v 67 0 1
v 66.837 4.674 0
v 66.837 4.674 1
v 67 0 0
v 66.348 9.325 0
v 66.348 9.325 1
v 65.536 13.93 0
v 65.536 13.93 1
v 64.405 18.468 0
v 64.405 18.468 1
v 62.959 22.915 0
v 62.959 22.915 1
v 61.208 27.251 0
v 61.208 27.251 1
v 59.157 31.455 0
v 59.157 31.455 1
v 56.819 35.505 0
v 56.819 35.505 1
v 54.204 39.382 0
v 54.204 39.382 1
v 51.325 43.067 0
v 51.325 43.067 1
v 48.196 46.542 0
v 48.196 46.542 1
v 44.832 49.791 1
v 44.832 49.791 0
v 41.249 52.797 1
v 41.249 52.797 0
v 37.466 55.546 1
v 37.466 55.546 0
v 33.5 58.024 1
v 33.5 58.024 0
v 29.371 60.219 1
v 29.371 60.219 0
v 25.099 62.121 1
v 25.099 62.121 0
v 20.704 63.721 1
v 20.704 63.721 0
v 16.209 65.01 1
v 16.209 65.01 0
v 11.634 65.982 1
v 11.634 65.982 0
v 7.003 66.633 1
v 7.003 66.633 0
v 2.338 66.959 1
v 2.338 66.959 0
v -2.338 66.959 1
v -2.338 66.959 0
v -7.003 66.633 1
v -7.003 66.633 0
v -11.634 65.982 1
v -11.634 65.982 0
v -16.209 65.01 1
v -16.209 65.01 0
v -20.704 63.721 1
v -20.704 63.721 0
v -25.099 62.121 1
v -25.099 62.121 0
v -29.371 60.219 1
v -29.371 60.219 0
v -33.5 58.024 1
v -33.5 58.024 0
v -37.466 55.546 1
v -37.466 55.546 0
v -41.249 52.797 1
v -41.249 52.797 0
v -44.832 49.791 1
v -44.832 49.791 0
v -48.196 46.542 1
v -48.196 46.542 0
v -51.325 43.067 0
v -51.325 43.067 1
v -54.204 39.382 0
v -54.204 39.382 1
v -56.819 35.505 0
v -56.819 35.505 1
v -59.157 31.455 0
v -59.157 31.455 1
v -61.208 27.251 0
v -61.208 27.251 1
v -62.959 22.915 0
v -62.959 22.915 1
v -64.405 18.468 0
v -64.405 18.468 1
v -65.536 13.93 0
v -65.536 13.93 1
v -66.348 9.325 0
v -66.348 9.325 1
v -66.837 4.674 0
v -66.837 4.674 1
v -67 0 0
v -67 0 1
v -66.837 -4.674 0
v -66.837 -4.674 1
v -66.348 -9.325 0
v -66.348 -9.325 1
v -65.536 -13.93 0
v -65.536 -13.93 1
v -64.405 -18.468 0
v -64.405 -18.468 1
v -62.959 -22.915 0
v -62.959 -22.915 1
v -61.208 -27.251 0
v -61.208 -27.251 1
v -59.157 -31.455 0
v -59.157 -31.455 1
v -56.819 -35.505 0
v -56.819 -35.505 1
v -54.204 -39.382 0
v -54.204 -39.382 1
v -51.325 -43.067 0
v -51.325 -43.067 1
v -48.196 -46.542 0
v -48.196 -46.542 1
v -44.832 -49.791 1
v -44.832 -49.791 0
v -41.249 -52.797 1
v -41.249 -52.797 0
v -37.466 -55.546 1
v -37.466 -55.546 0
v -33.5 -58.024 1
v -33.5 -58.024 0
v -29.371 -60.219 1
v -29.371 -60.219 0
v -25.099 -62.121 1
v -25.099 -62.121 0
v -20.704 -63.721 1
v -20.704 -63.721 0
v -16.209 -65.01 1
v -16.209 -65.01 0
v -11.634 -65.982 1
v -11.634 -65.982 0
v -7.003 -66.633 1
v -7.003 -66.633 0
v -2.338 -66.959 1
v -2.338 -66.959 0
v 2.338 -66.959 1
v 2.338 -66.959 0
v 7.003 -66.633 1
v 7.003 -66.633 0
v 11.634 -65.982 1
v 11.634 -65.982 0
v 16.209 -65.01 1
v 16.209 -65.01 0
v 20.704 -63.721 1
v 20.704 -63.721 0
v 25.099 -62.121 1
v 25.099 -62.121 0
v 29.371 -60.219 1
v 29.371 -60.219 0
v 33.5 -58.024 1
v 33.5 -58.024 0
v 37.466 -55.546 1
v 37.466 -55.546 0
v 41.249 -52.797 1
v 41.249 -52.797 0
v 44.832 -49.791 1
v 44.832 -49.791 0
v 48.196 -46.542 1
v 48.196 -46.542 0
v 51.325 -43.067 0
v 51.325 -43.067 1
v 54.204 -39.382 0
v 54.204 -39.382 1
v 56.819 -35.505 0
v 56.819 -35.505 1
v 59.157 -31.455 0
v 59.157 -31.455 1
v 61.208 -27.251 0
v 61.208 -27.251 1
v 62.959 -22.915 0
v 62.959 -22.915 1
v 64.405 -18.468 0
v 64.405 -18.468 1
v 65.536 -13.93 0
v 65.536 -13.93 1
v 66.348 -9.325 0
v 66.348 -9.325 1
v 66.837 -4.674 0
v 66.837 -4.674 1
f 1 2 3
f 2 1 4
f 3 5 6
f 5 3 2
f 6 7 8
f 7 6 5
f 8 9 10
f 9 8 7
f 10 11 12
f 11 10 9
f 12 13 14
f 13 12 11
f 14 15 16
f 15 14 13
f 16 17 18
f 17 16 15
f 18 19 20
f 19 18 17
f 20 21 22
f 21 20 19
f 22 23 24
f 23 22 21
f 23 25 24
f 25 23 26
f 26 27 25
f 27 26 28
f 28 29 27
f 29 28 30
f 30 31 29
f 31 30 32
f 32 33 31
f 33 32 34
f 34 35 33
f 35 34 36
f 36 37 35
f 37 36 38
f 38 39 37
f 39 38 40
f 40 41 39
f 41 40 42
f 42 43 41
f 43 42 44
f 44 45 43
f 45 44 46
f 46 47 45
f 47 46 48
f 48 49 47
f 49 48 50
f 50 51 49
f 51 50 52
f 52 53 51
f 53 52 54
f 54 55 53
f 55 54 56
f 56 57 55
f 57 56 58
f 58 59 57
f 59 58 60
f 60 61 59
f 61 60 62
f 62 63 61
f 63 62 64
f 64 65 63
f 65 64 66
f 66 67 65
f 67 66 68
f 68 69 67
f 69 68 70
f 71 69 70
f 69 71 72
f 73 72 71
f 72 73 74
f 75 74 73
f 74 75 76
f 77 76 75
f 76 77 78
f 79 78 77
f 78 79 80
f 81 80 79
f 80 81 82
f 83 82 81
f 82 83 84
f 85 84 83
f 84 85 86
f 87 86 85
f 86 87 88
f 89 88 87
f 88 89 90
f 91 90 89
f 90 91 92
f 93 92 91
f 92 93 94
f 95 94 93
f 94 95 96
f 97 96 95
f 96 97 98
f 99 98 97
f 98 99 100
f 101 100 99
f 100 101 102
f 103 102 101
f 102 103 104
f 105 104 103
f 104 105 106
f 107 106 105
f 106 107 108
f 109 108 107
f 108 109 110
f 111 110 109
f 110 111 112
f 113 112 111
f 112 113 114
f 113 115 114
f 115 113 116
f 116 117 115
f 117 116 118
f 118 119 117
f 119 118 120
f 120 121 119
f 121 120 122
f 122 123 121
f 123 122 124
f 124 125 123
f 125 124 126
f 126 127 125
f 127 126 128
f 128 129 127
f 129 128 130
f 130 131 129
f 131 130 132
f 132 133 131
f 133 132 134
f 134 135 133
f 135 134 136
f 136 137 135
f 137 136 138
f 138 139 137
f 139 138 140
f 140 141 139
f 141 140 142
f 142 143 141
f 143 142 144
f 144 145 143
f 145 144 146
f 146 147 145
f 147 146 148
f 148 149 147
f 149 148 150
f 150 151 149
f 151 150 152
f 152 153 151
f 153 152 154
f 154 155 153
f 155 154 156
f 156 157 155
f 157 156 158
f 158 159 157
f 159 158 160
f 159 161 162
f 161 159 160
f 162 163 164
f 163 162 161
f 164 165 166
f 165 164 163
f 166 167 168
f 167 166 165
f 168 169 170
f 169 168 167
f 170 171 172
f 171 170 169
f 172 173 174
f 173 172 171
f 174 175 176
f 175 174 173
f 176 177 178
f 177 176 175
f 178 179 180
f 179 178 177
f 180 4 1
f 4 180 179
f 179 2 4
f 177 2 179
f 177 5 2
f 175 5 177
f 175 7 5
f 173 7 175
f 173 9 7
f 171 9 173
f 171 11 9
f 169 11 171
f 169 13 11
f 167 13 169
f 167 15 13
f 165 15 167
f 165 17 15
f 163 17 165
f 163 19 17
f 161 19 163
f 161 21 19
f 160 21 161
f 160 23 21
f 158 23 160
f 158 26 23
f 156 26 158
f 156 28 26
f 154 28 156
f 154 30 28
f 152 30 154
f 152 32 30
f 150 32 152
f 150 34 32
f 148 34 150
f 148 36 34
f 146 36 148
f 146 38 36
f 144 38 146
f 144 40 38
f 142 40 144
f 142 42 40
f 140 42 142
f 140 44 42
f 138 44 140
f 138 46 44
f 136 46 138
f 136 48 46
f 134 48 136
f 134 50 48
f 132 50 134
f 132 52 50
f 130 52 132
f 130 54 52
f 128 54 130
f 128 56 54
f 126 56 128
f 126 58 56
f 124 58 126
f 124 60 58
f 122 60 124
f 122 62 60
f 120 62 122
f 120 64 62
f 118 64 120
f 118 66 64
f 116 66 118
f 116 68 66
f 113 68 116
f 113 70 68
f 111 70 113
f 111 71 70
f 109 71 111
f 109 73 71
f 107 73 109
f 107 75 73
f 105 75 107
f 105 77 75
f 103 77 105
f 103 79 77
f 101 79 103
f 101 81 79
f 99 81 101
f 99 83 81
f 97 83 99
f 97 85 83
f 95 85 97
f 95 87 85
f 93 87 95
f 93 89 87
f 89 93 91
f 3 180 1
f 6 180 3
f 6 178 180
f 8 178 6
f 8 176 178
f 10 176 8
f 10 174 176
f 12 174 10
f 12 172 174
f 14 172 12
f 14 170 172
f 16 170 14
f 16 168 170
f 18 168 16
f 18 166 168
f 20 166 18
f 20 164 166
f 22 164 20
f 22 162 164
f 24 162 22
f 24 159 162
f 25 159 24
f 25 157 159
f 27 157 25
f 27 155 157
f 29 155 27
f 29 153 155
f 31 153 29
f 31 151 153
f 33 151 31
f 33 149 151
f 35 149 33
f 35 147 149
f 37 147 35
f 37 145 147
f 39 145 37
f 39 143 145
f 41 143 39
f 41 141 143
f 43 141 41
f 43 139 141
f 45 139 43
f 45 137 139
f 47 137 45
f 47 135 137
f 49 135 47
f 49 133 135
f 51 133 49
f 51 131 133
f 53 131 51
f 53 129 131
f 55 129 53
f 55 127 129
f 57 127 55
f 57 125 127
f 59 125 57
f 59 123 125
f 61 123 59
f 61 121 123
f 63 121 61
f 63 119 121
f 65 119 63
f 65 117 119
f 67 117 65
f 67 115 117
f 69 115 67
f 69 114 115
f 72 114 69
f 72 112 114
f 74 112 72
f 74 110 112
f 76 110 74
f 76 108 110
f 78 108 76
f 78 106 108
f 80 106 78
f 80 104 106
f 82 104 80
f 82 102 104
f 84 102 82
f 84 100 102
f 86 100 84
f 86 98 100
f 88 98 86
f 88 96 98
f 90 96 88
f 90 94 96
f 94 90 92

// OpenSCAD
$fs=0.8; // def 1, 0.2 is high res
$fa=4;//def 12, 3 is very nice
%translate([0,0,-0.5])cube([200,200,1],center=true); //build platform

cylinder(1,67,67);
